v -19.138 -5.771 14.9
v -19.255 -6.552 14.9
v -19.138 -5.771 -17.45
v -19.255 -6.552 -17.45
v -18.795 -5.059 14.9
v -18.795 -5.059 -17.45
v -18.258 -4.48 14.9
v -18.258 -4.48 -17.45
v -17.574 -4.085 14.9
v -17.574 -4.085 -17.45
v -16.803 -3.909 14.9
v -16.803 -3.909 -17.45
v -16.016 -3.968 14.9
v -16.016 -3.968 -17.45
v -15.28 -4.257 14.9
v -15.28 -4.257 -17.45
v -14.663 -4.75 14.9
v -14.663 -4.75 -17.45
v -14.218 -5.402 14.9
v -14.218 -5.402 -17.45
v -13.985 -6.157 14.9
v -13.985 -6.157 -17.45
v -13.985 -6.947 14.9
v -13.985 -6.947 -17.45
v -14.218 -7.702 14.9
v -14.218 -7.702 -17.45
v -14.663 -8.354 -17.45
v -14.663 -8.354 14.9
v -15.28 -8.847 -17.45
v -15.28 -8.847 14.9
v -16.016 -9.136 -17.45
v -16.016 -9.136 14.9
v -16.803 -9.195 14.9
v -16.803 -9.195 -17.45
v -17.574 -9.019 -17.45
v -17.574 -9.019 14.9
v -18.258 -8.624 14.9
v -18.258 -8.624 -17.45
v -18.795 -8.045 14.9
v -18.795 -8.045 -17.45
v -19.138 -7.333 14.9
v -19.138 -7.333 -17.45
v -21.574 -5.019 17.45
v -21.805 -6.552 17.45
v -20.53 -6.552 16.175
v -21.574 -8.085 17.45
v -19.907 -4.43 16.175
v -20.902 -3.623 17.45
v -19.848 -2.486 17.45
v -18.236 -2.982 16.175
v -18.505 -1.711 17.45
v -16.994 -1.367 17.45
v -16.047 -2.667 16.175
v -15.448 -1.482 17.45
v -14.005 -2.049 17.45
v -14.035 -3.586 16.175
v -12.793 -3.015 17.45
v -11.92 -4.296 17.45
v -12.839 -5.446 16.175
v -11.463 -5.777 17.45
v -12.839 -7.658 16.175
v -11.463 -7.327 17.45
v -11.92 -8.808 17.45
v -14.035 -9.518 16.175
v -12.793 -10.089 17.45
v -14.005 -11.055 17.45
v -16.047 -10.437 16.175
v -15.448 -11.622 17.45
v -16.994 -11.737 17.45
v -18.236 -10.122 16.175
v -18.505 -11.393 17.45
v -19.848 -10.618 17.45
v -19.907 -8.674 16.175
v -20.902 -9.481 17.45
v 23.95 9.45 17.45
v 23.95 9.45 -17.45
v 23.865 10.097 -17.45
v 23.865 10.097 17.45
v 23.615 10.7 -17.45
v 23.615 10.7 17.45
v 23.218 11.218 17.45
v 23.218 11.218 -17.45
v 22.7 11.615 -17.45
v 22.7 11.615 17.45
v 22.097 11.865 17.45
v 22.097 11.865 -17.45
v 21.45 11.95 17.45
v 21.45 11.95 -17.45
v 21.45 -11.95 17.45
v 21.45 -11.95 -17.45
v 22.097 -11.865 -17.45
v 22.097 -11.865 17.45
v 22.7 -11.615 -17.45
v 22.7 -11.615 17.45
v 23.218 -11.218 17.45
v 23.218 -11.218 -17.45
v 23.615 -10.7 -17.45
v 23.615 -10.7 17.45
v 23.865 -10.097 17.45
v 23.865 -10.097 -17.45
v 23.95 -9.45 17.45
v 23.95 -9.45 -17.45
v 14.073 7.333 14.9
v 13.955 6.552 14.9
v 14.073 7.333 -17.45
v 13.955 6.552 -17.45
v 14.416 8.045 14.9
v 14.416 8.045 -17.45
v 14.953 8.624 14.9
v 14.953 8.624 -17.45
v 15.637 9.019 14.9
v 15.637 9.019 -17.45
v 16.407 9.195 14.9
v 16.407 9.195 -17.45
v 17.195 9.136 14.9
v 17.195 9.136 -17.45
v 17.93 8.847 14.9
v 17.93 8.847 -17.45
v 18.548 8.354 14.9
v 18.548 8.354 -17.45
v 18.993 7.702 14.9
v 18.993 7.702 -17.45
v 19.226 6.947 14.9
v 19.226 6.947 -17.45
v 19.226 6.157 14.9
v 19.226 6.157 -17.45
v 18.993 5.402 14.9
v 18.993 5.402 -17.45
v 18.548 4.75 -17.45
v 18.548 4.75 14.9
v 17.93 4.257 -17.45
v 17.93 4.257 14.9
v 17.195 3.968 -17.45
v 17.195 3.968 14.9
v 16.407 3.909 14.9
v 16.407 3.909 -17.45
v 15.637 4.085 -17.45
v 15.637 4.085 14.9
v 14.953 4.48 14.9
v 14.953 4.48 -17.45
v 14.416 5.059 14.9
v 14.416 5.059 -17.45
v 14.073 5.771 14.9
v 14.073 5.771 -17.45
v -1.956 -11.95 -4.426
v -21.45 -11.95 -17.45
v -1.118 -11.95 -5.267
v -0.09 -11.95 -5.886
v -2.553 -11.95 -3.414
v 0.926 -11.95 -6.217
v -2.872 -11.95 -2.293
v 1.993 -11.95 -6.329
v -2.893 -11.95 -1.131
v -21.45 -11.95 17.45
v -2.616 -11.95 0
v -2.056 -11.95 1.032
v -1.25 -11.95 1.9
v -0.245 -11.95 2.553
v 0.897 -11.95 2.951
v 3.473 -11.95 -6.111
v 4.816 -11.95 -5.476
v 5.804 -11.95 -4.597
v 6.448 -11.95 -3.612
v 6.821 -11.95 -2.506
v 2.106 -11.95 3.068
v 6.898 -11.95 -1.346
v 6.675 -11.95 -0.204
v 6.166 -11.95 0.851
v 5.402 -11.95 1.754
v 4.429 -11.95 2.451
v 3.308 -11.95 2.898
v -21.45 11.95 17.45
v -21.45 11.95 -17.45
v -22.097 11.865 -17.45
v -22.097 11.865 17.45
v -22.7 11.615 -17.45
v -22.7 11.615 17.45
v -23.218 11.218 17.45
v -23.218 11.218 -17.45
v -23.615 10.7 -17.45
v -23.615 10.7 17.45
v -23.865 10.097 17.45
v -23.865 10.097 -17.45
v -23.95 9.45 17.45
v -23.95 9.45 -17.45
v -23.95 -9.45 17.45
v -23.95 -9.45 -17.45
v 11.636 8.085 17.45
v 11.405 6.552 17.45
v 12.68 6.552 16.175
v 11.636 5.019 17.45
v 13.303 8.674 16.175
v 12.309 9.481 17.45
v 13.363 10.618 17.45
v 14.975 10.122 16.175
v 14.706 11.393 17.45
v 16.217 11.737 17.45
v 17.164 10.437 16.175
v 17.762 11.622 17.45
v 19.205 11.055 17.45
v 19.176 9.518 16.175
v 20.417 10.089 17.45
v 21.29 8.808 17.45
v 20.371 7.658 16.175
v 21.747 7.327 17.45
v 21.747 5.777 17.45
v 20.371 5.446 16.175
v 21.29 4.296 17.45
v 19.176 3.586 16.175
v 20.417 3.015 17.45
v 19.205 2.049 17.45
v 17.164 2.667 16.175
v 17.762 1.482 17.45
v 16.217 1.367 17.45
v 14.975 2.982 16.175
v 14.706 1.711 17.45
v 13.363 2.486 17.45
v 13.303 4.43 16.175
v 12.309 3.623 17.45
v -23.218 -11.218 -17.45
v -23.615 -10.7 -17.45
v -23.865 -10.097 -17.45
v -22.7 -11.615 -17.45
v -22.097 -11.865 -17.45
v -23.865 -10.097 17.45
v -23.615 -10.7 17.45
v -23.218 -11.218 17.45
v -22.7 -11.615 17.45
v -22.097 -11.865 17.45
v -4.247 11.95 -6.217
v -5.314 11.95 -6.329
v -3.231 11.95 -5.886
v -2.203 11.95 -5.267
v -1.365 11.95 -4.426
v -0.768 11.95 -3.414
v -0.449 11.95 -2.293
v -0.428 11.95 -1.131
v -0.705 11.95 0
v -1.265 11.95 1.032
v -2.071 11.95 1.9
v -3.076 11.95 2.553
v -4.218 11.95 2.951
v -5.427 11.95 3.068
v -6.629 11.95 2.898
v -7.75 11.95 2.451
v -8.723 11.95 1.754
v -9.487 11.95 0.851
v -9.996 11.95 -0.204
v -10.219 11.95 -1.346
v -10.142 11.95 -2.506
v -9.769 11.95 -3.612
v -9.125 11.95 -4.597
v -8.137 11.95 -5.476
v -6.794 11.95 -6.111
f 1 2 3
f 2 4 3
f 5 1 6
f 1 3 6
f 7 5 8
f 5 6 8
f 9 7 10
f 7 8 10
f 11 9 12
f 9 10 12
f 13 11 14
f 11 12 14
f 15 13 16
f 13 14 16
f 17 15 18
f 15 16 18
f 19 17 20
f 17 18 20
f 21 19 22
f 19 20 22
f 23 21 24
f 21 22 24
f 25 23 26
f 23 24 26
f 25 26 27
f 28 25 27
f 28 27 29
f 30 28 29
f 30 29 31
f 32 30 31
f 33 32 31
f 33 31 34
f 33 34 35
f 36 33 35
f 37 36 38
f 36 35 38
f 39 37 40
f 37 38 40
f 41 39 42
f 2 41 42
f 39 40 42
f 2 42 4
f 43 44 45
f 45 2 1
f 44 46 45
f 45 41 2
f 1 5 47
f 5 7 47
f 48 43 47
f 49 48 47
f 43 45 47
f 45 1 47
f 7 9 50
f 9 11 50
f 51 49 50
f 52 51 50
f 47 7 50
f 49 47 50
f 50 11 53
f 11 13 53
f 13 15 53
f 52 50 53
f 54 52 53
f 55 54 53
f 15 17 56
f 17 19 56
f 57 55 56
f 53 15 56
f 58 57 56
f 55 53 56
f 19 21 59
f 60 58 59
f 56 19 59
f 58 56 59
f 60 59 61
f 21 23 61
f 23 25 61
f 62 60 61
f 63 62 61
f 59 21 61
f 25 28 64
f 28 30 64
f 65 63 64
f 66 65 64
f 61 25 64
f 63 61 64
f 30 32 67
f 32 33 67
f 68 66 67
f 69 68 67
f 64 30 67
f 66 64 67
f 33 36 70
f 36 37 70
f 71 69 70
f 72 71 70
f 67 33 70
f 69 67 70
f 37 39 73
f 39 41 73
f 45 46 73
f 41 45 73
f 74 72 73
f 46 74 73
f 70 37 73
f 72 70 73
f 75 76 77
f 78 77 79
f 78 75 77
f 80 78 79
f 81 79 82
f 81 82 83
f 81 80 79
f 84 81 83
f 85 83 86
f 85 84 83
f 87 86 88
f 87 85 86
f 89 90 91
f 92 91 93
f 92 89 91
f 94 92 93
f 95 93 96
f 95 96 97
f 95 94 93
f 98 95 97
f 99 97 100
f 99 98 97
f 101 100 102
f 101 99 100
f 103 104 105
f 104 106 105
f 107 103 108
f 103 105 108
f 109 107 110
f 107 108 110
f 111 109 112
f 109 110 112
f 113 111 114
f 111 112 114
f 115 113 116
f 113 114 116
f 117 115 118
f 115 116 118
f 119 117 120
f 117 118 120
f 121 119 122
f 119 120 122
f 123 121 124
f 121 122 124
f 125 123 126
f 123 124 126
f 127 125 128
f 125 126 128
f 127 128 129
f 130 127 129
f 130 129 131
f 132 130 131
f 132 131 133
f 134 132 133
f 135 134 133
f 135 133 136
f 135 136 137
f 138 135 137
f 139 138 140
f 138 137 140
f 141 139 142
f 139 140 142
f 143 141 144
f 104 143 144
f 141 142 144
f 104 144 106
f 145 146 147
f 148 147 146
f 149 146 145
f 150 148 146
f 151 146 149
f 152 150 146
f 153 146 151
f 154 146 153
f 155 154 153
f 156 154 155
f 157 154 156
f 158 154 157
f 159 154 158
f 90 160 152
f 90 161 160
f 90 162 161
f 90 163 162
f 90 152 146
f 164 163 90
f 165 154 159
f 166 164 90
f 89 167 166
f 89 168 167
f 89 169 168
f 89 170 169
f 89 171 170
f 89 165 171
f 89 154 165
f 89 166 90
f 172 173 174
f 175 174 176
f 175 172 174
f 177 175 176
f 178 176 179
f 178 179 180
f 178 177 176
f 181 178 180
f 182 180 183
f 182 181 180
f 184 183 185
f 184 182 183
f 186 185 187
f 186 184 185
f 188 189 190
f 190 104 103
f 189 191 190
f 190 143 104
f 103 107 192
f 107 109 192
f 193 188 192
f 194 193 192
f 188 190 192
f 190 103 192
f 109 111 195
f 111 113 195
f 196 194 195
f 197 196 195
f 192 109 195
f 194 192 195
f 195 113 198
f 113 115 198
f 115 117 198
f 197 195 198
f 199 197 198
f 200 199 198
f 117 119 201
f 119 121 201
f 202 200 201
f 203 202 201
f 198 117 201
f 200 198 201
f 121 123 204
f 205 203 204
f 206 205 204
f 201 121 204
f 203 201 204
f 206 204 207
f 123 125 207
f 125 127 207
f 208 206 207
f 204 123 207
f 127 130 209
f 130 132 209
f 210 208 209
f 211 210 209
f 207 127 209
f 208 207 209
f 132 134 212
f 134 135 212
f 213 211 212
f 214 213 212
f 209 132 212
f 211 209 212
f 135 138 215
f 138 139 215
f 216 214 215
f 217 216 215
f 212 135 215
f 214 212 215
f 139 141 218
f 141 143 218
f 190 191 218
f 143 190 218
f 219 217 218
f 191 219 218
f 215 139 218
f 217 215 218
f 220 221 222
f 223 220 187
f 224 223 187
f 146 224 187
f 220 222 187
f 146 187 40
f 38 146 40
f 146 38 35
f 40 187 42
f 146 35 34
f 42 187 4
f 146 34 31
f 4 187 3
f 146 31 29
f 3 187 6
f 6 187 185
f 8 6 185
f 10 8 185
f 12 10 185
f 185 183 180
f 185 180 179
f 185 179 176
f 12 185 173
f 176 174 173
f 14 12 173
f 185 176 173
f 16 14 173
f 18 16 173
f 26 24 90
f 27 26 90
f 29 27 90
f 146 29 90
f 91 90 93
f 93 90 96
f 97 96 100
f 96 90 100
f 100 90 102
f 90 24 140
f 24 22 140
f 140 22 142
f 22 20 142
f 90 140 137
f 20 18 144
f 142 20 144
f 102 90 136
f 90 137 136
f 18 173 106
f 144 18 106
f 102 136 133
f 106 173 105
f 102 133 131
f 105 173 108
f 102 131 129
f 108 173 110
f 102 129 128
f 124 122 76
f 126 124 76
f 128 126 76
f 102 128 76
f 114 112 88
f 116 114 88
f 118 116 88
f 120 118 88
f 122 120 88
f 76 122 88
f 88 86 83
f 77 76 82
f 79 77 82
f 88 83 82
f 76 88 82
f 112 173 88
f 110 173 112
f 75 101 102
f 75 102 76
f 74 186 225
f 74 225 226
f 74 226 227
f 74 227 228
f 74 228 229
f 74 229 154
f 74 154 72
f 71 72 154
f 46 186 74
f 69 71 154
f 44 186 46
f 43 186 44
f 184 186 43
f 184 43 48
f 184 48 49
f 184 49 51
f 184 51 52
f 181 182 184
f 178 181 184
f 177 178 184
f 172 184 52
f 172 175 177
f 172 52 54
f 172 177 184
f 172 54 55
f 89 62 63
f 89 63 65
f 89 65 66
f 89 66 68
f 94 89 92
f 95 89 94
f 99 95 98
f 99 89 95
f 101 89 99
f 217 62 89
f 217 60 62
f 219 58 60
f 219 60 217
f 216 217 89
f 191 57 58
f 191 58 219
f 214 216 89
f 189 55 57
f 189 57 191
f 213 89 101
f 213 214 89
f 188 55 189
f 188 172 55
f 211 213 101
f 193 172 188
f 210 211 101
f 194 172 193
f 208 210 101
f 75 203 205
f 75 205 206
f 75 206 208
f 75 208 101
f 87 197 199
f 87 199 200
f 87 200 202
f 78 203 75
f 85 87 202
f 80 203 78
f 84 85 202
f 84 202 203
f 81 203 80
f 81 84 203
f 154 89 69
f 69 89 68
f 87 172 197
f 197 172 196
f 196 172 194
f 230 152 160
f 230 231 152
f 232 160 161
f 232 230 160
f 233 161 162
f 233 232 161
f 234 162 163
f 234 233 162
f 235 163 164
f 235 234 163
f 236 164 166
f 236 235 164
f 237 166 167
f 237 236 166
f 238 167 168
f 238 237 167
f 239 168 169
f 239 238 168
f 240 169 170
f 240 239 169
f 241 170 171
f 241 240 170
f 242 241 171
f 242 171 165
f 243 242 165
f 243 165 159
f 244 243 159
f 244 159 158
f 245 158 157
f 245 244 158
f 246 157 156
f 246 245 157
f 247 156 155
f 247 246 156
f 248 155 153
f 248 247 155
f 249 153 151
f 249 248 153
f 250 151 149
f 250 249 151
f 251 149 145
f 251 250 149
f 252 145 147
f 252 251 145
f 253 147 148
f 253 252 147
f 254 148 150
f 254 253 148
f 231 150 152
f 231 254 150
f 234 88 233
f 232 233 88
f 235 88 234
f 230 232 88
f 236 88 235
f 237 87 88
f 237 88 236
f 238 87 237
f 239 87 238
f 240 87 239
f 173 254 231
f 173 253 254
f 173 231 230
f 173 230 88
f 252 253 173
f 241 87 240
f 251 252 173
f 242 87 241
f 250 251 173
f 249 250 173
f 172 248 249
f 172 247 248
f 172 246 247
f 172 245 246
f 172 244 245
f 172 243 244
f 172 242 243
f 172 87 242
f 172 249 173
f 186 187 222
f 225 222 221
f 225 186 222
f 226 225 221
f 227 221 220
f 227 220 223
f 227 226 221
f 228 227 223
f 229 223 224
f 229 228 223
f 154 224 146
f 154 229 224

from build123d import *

# Parameters (mm, degrees)
BOSS_EXTRUDE1_DEPTH                             = 17.45
CSK_FOR_M5_FLAT_HEAD_MACHINE_SCREW1_D           = 5.3
CSK_FOR_M5_FLAT_HEAD_MACHINE_SCREW1_CSINK_D     = 10.4
CSK_FOR_M5_FLAT_HEAD_MACHINE_SCREW1_CSINK_ANGLE = 90
SKETCH24_W                                      = 4.699
SKETCH24_H                                      = 43.607186054


with BuildPart() as part:
    # Sketch1 → Boss-Extrude1 (new body, symmetric)
    with BuildSketch(Plane.XY):
        with BuildLine():
            Line((-21.45, -11.95), (21.45, -11.95))
            ThreePointArc((21.45, -11.95), (23.217766953, -11.217766953), (23.95, -9.45))
            Line((23.95, -9.45), (23.95, 9.45))
            ThreePointArc((23.95, 9.45), (23.217766953, 11.217766953), (21.45, 11.95))
            Line((21.45, 11.95), (-21.45, 11.95))
            ThreePointArc((-21.45, 11.95), (-23.217766953, 11.217766953), (-23.95, 9.45))
            Line((-23.95, 9.45), (-23.95, -9.45))
            ThreePointArc((-23.95, -9.45), (-23.217766953, -11.217766953), (-21.45, -11.95))
        make_face()
    extrude(amount=BOSS_EXTRUDE1_DEPTH, both=True)

    # CSK for M5 Flat Head Machine Screw1 (through all)
    with Locations(Plane.XY.offset(17.45)):
        with Locations((-16.605361405, -6.552011076), (16.605361405, 6.552011076)):
            CounterSinkHole(CSK_FOR_M5_FLAT_HEAD_MACHINE_SCREW1_D / 2, CSK_FOR_M5_FLAT_HEAD_MACHINE_SCREW1_CSINK_D / 2, counter_sink_angle=CSK_FOR_M5_FLAT_HEAD_MACHINE_SCREW1_CSINK_ANGLE)

    # Sketch24 → Cut-Revolve2 (revolve, cut)
    with BuildSketch(Plane(origin=(-1.518528381, -0.464260717, 0), x_dir=(0, 0, -1), z_dir=(0.956304756, 0.292371705, 0))):
        with Locations((3.9795, -0.045167625)):
            Rectangle(SKETCH24_W, SKETCH24_H)
    revolve(axis=Axis((-7.880076307, 20.343424977, -1.63), (0.292371705, -0.956304756, 0)), mode=Mode.SUBTRACT)


solid = part.part
